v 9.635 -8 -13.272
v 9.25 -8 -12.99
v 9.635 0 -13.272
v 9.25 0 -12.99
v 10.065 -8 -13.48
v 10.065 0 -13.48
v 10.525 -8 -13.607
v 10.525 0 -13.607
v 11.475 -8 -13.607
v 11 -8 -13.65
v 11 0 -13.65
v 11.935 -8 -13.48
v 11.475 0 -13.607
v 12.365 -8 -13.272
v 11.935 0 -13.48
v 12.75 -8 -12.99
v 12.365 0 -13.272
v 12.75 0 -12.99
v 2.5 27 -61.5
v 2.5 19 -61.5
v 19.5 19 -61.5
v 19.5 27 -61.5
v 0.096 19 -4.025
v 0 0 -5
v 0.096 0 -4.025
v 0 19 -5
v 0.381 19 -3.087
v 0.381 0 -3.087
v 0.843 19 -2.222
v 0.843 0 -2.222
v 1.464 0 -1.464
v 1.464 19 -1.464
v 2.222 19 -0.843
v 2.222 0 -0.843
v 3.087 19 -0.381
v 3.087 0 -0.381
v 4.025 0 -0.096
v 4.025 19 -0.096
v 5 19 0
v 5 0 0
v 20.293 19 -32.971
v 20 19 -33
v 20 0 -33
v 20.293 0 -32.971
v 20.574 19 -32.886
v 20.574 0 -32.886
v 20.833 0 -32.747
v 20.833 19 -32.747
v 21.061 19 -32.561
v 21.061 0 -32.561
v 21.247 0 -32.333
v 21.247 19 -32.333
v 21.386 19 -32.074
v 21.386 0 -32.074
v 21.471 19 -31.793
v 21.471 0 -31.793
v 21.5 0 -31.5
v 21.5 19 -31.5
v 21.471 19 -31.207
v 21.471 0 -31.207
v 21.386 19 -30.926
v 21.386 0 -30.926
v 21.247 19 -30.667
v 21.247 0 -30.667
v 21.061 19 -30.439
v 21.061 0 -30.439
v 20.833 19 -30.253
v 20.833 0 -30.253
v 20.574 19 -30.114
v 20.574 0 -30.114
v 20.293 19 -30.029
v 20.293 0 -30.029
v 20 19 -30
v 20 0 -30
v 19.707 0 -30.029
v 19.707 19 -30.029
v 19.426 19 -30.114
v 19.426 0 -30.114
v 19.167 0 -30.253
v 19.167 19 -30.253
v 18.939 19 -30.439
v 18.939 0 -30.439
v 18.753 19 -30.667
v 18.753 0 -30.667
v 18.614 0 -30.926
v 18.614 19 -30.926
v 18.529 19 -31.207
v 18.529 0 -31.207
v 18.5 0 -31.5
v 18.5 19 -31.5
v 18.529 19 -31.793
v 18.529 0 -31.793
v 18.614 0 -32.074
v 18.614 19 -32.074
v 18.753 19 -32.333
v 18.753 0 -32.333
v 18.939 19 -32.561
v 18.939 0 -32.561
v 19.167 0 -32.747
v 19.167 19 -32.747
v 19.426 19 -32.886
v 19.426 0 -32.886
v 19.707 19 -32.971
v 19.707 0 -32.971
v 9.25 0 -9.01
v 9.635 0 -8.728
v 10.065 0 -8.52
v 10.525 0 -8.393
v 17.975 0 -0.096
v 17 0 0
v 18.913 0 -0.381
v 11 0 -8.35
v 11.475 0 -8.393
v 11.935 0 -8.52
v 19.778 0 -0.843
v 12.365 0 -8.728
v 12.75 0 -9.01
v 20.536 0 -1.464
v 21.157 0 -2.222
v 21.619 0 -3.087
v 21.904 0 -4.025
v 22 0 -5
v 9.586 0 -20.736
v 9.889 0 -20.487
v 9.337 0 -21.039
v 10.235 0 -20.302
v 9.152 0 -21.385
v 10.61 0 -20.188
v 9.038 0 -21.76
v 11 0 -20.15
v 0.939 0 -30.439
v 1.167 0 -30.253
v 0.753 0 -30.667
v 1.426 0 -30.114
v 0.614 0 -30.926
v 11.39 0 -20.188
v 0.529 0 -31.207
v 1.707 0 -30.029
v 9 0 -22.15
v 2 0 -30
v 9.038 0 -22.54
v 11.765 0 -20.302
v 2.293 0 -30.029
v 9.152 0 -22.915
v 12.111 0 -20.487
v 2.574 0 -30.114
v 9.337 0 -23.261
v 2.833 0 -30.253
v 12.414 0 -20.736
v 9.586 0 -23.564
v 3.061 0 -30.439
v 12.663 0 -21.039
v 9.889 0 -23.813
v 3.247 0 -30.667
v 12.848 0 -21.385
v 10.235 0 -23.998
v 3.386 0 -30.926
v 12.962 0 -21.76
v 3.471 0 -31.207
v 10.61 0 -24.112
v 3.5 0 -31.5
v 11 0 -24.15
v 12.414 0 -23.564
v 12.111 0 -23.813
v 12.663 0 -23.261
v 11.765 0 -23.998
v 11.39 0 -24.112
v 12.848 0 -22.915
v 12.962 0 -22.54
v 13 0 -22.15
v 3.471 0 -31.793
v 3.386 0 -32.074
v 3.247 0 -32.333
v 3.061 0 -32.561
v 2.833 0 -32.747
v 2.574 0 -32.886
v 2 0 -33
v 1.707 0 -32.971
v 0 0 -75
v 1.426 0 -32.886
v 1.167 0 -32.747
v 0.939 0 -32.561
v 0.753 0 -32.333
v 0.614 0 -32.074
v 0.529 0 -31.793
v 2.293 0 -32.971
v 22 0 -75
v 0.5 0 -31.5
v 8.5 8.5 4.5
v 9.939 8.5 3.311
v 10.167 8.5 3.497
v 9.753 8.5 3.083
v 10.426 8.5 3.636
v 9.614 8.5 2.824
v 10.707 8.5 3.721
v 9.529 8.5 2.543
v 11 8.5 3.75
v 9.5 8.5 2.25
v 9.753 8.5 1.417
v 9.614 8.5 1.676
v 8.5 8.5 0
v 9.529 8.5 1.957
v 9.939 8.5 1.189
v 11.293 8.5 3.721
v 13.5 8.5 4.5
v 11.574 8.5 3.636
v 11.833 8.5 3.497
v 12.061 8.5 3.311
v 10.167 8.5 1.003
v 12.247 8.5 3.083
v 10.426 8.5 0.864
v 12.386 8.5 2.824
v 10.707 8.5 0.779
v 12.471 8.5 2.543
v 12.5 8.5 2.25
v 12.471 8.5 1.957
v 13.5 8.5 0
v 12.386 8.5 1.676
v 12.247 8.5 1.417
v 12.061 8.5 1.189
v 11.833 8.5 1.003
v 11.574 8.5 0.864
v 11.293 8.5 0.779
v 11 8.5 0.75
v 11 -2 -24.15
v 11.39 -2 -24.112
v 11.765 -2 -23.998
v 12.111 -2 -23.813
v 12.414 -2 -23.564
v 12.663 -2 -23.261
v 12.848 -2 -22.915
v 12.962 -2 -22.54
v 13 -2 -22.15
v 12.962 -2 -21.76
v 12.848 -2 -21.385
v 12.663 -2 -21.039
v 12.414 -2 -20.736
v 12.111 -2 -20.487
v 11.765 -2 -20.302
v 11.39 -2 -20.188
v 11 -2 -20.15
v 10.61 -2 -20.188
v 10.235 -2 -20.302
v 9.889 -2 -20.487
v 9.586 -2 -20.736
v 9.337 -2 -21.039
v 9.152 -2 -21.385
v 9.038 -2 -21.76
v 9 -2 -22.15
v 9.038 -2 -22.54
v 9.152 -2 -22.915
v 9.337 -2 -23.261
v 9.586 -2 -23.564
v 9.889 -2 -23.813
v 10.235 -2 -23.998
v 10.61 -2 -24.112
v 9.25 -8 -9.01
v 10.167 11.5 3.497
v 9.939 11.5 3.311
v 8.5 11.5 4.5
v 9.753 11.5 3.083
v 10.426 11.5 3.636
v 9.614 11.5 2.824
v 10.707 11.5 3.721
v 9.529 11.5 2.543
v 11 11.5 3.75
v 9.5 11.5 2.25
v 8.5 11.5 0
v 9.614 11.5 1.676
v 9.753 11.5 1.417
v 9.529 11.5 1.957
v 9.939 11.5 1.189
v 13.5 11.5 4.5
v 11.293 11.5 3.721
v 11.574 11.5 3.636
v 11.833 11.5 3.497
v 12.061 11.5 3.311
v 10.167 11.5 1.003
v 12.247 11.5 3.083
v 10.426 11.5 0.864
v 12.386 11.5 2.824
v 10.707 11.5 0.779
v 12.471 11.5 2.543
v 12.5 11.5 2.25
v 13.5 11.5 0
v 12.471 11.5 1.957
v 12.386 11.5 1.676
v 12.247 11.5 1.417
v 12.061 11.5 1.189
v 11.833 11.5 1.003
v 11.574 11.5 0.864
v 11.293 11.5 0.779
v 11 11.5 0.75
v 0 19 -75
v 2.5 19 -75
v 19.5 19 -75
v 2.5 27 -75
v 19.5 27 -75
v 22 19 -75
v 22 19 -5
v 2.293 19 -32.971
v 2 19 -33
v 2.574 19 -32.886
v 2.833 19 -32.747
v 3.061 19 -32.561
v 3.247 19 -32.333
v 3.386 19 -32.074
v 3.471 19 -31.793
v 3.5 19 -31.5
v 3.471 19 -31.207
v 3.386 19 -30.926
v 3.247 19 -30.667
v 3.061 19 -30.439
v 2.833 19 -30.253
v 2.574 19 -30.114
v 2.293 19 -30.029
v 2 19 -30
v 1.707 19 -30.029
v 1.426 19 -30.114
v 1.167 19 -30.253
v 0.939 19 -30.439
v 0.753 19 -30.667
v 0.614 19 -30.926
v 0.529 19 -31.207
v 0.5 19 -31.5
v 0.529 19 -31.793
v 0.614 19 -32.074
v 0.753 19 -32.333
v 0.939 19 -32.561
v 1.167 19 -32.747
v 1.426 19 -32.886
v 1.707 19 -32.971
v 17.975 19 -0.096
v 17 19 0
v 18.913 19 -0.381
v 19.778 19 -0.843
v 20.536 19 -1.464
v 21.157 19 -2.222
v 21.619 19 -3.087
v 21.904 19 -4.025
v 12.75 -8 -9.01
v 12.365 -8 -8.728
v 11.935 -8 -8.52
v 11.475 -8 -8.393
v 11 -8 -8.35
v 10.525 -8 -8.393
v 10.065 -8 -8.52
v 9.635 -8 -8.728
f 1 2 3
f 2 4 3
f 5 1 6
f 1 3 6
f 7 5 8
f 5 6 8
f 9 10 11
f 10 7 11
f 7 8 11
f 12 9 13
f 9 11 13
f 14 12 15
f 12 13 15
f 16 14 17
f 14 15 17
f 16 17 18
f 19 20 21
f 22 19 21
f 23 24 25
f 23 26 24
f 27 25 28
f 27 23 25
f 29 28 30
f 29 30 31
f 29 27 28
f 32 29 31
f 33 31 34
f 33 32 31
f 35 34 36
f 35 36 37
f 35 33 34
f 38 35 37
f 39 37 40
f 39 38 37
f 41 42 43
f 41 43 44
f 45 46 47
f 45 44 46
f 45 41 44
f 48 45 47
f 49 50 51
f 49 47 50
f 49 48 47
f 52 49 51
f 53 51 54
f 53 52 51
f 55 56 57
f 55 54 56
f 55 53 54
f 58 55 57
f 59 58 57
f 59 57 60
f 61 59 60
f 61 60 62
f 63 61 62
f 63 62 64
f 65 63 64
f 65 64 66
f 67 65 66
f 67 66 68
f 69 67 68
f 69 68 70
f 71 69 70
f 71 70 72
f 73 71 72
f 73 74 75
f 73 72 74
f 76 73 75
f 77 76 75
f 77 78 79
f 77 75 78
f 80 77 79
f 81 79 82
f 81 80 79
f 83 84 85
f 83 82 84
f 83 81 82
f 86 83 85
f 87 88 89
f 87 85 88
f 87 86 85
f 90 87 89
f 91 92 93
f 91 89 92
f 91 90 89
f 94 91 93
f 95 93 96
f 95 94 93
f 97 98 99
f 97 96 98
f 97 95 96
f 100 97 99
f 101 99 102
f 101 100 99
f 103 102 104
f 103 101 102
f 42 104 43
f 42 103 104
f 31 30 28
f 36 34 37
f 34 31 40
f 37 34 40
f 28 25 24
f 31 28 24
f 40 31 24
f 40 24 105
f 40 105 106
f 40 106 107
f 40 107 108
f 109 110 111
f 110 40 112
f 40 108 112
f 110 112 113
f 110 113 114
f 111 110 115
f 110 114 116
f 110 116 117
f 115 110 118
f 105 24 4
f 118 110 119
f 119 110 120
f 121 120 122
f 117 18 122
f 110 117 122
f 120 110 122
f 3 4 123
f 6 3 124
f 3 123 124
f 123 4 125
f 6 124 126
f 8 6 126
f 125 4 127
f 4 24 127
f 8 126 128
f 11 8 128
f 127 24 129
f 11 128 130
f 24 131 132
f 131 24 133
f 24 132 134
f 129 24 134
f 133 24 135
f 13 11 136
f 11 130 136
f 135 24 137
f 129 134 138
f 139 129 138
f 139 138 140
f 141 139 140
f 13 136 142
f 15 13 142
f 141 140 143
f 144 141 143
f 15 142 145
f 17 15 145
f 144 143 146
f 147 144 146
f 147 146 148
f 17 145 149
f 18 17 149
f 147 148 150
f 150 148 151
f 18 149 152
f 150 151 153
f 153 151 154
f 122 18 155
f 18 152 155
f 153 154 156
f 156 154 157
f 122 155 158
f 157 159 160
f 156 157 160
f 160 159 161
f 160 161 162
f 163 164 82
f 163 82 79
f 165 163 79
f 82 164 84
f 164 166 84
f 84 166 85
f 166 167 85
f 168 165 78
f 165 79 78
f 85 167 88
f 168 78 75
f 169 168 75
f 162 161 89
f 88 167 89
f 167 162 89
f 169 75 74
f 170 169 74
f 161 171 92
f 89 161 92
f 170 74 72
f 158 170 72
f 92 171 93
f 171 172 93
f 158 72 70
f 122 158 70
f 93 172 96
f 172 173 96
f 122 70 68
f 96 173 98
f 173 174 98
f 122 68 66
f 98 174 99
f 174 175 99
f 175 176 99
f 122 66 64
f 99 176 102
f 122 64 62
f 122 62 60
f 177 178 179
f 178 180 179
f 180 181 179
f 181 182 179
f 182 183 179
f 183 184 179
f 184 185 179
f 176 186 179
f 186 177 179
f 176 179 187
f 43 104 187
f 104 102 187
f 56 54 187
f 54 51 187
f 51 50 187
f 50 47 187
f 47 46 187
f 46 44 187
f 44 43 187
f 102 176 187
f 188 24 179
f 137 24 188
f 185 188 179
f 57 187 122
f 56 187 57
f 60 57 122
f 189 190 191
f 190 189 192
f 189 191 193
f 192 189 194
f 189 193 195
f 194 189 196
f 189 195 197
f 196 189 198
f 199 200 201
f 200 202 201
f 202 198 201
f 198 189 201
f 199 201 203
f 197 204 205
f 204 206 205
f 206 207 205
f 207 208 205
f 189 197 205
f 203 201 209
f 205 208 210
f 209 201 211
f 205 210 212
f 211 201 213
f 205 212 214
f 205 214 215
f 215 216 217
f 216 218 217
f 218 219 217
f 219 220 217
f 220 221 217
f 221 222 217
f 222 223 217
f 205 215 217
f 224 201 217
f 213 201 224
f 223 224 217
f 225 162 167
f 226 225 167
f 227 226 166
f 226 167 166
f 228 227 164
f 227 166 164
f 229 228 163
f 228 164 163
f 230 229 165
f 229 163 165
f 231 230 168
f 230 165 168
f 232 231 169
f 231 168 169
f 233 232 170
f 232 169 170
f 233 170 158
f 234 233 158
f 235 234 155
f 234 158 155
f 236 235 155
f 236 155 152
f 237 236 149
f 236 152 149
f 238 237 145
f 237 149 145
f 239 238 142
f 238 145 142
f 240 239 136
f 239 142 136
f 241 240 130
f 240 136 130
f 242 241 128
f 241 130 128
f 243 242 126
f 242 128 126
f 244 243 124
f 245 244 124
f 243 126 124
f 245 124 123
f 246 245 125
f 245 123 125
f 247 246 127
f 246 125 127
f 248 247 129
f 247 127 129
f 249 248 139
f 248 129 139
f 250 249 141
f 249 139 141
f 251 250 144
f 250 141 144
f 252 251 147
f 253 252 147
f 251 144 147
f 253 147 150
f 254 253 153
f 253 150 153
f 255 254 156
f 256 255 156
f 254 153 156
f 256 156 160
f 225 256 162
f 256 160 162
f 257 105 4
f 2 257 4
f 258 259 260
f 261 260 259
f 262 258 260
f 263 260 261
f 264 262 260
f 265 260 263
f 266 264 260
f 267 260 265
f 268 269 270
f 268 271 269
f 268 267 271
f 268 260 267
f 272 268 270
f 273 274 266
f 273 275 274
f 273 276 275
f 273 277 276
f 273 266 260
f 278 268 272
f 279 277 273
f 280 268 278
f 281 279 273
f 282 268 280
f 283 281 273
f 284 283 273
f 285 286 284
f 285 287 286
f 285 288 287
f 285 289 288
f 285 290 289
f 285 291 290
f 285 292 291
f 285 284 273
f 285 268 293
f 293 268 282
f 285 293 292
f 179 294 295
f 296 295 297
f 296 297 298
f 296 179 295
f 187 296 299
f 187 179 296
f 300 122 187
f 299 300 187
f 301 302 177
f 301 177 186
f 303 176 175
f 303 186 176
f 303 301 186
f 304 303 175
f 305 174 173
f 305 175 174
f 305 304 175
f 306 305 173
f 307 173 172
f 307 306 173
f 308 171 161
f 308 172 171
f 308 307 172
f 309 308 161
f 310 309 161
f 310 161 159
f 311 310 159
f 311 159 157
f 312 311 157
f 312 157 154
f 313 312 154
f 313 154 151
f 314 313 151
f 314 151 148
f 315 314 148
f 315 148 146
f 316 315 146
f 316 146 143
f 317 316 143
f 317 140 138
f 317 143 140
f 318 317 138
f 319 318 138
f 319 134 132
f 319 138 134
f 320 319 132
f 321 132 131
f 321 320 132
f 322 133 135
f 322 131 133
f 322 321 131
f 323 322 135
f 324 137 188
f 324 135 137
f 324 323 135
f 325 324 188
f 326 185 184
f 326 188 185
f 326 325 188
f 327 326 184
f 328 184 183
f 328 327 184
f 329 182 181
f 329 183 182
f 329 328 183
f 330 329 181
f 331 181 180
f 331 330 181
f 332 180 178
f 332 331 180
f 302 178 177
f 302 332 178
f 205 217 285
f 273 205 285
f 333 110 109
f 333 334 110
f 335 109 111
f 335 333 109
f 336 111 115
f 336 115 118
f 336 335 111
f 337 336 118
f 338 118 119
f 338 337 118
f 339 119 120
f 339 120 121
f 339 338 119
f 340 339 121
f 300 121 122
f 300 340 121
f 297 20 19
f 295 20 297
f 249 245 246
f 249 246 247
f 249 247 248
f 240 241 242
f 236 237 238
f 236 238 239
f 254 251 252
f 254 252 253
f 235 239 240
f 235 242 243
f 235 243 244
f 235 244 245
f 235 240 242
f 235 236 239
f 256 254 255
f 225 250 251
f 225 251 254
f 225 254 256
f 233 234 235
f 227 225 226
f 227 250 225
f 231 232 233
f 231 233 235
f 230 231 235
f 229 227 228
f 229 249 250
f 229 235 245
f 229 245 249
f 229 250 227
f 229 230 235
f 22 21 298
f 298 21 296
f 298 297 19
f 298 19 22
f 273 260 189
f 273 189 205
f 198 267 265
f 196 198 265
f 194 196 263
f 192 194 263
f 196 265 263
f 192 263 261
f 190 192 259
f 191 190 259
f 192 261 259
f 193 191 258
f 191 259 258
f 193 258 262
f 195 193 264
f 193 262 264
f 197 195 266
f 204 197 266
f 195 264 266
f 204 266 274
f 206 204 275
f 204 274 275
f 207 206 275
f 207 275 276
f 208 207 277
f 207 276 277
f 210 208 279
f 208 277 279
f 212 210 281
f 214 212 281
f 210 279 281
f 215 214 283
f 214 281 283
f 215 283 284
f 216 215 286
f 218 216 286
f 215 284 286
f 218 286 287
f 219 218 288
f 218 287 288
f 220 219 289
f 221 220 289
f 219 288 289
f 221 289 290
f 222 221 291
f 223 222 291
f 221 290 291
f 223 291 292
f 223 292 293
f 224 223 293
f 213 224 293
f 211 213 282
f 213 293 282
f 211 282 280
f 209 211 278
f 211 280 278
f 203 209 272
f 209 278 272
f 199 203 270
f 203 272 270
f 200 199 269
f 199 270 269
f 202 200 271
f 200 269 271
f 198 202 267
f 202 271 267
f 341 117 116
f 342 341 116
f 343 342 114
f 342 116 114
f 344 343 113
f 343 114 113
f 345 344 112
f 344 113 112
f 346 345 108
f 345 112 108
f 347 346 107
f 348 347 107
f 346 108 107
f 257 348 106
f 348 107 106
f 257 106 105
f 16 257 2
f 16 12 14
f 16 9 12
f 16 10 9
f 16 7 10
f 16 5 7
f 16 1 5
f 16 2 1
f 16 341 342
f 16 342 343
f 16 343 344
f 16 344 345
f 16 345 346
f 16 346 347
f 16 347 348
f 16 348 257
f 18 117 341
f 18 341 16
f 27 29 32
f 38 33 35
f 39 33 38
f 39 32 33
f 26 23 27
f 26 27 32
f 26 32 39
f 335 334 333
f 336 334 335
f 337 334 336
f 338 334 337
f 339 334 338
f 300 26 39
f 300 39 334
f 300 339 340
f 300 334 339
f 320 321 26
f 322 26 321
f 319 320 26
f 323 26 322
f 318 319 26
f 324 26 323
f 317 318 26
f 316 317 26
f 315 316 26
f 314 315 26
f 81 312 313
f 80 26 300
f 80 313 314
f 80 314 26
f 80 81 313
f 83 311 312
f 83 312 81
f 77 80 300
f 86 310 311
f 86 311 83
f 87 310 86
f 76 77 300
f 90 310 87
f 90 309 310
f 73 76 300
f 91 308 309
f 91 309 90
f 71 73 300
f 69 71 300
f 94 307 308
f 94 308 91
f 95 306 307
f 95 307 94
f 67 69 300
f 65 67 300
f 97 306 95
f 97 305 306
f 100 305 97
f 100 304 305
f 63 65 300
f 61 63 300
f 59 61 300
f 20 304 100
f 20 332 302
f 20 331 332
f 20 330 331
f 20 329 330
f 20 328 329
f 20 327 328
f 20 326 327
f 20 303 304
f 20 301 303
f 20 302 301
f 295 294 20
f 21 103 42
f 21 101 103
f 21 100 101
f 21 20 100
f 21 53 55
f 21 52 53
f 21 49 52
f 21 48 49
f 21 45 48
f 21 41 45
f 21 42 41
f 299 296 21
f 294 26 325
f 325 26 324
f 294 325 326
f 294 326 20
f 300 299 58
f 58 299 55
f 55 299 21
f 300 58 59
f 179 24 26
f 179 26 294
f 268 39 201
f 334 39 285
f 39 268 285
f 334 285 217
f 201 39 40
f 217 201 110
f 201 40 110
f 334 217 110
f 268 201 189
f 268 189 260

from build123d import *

# Parameters (mm, degrees)
SKETCH1_W               = 22
SKETCH1_H               = 75
BOSS_EXTRUDE1_DEPTH     = 19
SKETCH2_W               = 17
SKETCH2_H               = 13.5
BOSS_EXTRUDE2_DEPTH     = 8
FILLET1_R               = 5
SKETCH4_R               = 2.65
BOSS_EXTRUDE3_DEPTH     = 8
CUT_EXTRUDE1_DEPTH      = 83.692200358
CUT_EXTRUDE1_DEPTH_BACK = 83.692200358
SKETCH5_R               = 1.5
SKETCH6_R               = 2
SKETCH6_R_2             = 2.65
BOSS_EXTRUDE4_DEPTH     = 2
CUT_EXTRUDE2_DEPTH      = 86.638776264
CUT_EXTRUDE2_DEPTH_BACK = 8
SKETCH8_W               = 5
SKETCH8_H               = 3
BOSS_EXTRUDE5_DEPTH     = 4.5
SKETCH9_R               = 1.5
CUT_EXTRUDE3_DEPTH      = 3


with BuildPart() as part:
    # Sketch1 → Boss-Extrude1 (new body)
    with BuildSketch(Plane(origin=(0, 0, 0), x_dir=(1, 0, 0), z_dir=(0, 1, 0))):
        with Locations((11, 37.5)):
            Rectangle(SKETCH1_W, SKETCH1_H)
    extrude(amount=BOSS_EXTRUDE1_DEPTH)

    # Sketch2 → Boss-Extrude2 (add)
    with BuildSketch(Plane(origin=(0, 19, 0), x_dir=(1, 0, 0), z_dir=(0, 1, 0))):
        with Locations((11, 68.25)):
            Rectangle(SKETCH2_W, SKETCH2_H)
    extrude(amount=BOSS_EXTRUDE2_DEPTH)

    # Fillet1
    fillet1_edges = [part.edges().sort_by_distance(p)[0] for p in [
        (22, 9.5, 0),
        (0, 9.5, 0),
    ]]
    fillet(fillet1_edges, radius=FILLET1_R)

    # Sketch4 → Boss-Extrude3 (add)
    with BuildSketch(Plane.XZ):
        with Locations(Location((11, -11, 0), (0, 0, 270))):
            Circle(SKETCH4_R)
    extrude(amount=BOSS_EXTRUDE3_DEPTH)

    # Sketch5 → Cut-Extrude1 (cut, two sides: drawn at the far end of the back side and taken through both)
    with BuildSketch(Plane.XZ.offset(-CUT_EXTRUDE1_DEPTH_BACK)):
        with Locations(Location((20, -31.5, 0), (0, 0, 270))):
            Circle(SKETCH5_R)
        with Locations(Location((2, -31.5, 0), (0, 0, 270))):
            Circle(SKETCH5_R)
    extrude(amount=CUT_EXTRUDE1_DEPTH + CUT_EXTRUDE1_DEPTH_BACK, mode=Mode.SUBTRACT)

    # Sketch6 → Boss-Extrude4 (add)
    with BuildSketch(Plane.XZ):
        with Locations(Location((11, -22.15, 0), (0, 0, 270))):
            Circle(SKETCH6_R)
        with Locations(Location((11, -11, 0), (0, 0, 270))):
            Circle(SKETCH6_R_2)
    extrude(amount=BOSS_EXTRUDE4_DEPTH)

    # Sketch7 → Cut-Extrude2 (cut, two sides: drawn at the far end of the back side and taken through both)
    with BuildSketch(Plane.XZ.offset(8).offset(-CUT_EXTRUDE2_DEPTH_BACK)):
        with BuildLine():
            Line((12.75, -9.010025126), (12.75, -12.989974874))
            ThreePointArc((12.75, -12.989974874), (13.65, -11), (12.75, -9.010025126))
        make_face()
        with BuildLine():
            Line((9.25, -9.010025126), (9.25, -12.989974874))
            ThreePointArc((9.25, -12.989974874), (8.35, -11), (9.25, -9.010025126))
        make_face()
    extrude(amount=CUT_EXTRUDE2_DEPTH + CUT_EXTRUDE2_DEPTH_BACK, mode=Mode.SUBTRACT)

    # Sketch8 → Boss-Extrude5 (add)
    with BuildSketch(Plane.XY):
        with Locations((11, 10)):
            Rectangle(SKETCH8_W, SKETCH8_H)
    extrude(amount=BOSS_EXTRUDE5_DEPTH)

    # Sketch9 → Cut-Extrude3 (cut)
    with BuildSketch(Plane(origin=(0, 11.5, 0), x_dir=(1, 0, 0), z_dir=(0, 1, 0))):
        with Locations(Location((11, -2.25, 0), (0, 0, 180))):
            Circle(SKETCH9_R)
    extrude(amount=-CUT_EXTRUDE3_DEPTH, mode=Mode.SUBTRACT)


solid = part.part
